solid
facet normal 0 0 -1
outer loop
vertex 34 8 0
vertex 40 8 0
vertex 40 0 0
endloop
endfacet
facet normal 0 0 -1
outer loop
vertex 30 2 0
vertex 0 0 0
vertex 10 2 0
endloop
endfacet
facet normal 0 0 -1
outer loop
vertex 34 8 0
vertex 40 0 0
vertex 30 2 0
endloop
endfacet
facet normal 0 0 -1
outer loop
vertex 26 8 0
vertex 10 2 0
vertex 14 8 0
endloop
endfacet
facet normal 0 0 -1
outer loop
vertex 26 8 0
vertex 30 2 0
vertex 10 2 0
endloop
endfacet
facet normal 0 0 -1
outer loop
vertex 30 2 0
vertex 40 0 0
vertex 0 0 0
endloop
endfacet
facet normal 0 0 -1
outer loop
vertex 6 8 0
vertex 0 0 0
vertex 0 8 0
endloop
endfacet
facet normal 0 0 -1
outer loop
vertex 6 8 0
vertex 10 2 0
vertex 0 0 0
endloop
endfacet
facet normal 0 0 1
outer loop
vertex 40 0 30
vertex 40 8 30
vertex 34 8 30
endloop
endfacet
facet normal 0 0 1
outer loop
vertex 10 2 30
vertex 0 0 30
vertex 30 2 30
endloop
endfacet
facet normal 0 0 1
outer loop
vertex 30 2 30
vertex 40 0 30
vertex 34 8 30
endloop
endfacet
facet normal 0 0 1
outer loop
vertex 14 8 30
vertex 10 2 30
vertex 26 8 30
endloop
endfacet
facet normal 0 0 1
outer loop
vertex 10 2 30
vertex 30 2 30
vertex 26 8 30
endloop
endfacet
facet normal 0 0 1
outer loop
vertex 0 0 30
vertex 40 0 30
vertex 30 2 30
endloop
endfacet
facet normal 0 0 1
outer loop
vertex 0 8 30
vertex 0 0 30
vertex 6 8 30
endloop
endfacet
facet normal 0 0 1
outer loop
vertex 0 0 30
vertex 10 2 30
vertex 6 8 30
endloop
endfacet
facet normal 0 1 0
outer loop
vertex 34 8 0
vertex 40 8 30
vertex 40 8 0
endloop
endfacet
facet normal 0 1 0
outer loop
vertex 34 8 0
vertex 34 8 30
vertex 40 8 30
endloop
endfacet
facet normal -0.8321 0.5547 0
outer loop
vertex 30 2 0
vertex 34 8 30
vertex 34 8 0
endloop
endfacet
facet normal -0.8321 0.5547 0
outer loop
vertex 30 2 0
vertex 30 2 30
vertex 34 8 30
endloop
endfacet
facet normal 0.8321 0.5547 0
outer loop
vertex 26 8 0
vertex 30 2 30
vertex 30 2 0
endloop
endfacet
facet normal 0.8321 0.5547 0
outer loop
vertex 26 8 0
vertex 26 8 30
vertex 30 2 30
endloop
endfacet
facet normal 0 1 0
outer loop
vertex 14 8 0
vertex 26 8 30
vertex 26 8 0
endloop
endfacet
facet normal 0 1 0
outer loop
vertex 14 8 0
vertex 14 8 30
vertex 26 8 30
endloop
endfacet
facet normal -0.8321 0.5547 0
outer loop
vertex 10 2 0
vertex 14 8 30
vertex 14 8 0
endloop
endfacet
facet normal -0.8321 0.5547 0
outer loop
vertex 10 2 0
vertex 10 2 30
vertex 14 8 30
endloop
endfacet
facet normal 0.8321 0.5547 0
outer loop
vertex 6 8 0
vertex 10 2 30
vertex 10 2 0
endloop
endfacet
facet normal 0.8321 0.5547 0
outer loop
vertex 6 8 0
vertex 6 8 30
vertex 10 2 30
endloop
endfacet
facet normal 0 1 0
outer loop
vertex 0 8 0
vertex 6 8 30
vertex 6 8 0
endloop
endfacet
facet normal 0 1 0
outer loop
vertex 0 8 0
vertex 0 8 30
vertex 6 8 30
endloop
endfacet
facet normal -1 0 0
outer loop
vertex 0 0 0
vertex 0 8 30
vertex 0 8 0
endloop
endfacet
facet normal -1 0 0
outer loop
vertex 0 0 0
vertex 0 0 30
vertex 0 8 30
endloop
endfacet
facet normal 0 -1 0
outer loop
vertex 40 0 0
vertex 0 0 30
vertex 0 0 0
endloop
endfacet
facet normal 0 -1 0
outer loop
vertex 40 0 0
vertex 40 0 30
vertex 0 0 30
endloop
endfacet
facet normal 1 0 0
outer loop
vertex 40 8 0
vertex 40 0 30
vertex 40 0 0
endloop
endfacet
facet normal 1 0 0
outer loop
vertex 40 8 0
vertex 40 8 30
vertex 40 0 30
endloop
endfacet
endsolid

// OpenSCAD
$fn = 32;

// ----------------------------------------------------------------------
// V guide rail: doublev, 40 mm wide
// ----------------------------------------------------------------------

// --- parameters (mm) ---
rail_w = 40;              // rail width, X
base_t = 8;               // base plate thickness
v_depth = 6;              // V feature depth / height
v_half_w = 8;             // half width of the V at the base face
plate_t = 30;             // rail length, Z (the extrusion height)
groove_off = 10;          // offset of each groove from the centreline

centre_x = rail_w / 2;  // rail centreline
groove_a = centre_x - groove_off;  // axis of the first groove
groove_b = centre_x + groove_off;  // axis of the second groove

profile = [[0, 0], [40, 0], [40, 8], [34, 8], [30, 2], [26, 8], [14, 8], [10, 2], [6, 8], [0, 8]];  // primary outline, 10 points, counter clockwise

// --- the one profile operation ---
linear_extrude(height = plate_t) polygon(points = profile);
